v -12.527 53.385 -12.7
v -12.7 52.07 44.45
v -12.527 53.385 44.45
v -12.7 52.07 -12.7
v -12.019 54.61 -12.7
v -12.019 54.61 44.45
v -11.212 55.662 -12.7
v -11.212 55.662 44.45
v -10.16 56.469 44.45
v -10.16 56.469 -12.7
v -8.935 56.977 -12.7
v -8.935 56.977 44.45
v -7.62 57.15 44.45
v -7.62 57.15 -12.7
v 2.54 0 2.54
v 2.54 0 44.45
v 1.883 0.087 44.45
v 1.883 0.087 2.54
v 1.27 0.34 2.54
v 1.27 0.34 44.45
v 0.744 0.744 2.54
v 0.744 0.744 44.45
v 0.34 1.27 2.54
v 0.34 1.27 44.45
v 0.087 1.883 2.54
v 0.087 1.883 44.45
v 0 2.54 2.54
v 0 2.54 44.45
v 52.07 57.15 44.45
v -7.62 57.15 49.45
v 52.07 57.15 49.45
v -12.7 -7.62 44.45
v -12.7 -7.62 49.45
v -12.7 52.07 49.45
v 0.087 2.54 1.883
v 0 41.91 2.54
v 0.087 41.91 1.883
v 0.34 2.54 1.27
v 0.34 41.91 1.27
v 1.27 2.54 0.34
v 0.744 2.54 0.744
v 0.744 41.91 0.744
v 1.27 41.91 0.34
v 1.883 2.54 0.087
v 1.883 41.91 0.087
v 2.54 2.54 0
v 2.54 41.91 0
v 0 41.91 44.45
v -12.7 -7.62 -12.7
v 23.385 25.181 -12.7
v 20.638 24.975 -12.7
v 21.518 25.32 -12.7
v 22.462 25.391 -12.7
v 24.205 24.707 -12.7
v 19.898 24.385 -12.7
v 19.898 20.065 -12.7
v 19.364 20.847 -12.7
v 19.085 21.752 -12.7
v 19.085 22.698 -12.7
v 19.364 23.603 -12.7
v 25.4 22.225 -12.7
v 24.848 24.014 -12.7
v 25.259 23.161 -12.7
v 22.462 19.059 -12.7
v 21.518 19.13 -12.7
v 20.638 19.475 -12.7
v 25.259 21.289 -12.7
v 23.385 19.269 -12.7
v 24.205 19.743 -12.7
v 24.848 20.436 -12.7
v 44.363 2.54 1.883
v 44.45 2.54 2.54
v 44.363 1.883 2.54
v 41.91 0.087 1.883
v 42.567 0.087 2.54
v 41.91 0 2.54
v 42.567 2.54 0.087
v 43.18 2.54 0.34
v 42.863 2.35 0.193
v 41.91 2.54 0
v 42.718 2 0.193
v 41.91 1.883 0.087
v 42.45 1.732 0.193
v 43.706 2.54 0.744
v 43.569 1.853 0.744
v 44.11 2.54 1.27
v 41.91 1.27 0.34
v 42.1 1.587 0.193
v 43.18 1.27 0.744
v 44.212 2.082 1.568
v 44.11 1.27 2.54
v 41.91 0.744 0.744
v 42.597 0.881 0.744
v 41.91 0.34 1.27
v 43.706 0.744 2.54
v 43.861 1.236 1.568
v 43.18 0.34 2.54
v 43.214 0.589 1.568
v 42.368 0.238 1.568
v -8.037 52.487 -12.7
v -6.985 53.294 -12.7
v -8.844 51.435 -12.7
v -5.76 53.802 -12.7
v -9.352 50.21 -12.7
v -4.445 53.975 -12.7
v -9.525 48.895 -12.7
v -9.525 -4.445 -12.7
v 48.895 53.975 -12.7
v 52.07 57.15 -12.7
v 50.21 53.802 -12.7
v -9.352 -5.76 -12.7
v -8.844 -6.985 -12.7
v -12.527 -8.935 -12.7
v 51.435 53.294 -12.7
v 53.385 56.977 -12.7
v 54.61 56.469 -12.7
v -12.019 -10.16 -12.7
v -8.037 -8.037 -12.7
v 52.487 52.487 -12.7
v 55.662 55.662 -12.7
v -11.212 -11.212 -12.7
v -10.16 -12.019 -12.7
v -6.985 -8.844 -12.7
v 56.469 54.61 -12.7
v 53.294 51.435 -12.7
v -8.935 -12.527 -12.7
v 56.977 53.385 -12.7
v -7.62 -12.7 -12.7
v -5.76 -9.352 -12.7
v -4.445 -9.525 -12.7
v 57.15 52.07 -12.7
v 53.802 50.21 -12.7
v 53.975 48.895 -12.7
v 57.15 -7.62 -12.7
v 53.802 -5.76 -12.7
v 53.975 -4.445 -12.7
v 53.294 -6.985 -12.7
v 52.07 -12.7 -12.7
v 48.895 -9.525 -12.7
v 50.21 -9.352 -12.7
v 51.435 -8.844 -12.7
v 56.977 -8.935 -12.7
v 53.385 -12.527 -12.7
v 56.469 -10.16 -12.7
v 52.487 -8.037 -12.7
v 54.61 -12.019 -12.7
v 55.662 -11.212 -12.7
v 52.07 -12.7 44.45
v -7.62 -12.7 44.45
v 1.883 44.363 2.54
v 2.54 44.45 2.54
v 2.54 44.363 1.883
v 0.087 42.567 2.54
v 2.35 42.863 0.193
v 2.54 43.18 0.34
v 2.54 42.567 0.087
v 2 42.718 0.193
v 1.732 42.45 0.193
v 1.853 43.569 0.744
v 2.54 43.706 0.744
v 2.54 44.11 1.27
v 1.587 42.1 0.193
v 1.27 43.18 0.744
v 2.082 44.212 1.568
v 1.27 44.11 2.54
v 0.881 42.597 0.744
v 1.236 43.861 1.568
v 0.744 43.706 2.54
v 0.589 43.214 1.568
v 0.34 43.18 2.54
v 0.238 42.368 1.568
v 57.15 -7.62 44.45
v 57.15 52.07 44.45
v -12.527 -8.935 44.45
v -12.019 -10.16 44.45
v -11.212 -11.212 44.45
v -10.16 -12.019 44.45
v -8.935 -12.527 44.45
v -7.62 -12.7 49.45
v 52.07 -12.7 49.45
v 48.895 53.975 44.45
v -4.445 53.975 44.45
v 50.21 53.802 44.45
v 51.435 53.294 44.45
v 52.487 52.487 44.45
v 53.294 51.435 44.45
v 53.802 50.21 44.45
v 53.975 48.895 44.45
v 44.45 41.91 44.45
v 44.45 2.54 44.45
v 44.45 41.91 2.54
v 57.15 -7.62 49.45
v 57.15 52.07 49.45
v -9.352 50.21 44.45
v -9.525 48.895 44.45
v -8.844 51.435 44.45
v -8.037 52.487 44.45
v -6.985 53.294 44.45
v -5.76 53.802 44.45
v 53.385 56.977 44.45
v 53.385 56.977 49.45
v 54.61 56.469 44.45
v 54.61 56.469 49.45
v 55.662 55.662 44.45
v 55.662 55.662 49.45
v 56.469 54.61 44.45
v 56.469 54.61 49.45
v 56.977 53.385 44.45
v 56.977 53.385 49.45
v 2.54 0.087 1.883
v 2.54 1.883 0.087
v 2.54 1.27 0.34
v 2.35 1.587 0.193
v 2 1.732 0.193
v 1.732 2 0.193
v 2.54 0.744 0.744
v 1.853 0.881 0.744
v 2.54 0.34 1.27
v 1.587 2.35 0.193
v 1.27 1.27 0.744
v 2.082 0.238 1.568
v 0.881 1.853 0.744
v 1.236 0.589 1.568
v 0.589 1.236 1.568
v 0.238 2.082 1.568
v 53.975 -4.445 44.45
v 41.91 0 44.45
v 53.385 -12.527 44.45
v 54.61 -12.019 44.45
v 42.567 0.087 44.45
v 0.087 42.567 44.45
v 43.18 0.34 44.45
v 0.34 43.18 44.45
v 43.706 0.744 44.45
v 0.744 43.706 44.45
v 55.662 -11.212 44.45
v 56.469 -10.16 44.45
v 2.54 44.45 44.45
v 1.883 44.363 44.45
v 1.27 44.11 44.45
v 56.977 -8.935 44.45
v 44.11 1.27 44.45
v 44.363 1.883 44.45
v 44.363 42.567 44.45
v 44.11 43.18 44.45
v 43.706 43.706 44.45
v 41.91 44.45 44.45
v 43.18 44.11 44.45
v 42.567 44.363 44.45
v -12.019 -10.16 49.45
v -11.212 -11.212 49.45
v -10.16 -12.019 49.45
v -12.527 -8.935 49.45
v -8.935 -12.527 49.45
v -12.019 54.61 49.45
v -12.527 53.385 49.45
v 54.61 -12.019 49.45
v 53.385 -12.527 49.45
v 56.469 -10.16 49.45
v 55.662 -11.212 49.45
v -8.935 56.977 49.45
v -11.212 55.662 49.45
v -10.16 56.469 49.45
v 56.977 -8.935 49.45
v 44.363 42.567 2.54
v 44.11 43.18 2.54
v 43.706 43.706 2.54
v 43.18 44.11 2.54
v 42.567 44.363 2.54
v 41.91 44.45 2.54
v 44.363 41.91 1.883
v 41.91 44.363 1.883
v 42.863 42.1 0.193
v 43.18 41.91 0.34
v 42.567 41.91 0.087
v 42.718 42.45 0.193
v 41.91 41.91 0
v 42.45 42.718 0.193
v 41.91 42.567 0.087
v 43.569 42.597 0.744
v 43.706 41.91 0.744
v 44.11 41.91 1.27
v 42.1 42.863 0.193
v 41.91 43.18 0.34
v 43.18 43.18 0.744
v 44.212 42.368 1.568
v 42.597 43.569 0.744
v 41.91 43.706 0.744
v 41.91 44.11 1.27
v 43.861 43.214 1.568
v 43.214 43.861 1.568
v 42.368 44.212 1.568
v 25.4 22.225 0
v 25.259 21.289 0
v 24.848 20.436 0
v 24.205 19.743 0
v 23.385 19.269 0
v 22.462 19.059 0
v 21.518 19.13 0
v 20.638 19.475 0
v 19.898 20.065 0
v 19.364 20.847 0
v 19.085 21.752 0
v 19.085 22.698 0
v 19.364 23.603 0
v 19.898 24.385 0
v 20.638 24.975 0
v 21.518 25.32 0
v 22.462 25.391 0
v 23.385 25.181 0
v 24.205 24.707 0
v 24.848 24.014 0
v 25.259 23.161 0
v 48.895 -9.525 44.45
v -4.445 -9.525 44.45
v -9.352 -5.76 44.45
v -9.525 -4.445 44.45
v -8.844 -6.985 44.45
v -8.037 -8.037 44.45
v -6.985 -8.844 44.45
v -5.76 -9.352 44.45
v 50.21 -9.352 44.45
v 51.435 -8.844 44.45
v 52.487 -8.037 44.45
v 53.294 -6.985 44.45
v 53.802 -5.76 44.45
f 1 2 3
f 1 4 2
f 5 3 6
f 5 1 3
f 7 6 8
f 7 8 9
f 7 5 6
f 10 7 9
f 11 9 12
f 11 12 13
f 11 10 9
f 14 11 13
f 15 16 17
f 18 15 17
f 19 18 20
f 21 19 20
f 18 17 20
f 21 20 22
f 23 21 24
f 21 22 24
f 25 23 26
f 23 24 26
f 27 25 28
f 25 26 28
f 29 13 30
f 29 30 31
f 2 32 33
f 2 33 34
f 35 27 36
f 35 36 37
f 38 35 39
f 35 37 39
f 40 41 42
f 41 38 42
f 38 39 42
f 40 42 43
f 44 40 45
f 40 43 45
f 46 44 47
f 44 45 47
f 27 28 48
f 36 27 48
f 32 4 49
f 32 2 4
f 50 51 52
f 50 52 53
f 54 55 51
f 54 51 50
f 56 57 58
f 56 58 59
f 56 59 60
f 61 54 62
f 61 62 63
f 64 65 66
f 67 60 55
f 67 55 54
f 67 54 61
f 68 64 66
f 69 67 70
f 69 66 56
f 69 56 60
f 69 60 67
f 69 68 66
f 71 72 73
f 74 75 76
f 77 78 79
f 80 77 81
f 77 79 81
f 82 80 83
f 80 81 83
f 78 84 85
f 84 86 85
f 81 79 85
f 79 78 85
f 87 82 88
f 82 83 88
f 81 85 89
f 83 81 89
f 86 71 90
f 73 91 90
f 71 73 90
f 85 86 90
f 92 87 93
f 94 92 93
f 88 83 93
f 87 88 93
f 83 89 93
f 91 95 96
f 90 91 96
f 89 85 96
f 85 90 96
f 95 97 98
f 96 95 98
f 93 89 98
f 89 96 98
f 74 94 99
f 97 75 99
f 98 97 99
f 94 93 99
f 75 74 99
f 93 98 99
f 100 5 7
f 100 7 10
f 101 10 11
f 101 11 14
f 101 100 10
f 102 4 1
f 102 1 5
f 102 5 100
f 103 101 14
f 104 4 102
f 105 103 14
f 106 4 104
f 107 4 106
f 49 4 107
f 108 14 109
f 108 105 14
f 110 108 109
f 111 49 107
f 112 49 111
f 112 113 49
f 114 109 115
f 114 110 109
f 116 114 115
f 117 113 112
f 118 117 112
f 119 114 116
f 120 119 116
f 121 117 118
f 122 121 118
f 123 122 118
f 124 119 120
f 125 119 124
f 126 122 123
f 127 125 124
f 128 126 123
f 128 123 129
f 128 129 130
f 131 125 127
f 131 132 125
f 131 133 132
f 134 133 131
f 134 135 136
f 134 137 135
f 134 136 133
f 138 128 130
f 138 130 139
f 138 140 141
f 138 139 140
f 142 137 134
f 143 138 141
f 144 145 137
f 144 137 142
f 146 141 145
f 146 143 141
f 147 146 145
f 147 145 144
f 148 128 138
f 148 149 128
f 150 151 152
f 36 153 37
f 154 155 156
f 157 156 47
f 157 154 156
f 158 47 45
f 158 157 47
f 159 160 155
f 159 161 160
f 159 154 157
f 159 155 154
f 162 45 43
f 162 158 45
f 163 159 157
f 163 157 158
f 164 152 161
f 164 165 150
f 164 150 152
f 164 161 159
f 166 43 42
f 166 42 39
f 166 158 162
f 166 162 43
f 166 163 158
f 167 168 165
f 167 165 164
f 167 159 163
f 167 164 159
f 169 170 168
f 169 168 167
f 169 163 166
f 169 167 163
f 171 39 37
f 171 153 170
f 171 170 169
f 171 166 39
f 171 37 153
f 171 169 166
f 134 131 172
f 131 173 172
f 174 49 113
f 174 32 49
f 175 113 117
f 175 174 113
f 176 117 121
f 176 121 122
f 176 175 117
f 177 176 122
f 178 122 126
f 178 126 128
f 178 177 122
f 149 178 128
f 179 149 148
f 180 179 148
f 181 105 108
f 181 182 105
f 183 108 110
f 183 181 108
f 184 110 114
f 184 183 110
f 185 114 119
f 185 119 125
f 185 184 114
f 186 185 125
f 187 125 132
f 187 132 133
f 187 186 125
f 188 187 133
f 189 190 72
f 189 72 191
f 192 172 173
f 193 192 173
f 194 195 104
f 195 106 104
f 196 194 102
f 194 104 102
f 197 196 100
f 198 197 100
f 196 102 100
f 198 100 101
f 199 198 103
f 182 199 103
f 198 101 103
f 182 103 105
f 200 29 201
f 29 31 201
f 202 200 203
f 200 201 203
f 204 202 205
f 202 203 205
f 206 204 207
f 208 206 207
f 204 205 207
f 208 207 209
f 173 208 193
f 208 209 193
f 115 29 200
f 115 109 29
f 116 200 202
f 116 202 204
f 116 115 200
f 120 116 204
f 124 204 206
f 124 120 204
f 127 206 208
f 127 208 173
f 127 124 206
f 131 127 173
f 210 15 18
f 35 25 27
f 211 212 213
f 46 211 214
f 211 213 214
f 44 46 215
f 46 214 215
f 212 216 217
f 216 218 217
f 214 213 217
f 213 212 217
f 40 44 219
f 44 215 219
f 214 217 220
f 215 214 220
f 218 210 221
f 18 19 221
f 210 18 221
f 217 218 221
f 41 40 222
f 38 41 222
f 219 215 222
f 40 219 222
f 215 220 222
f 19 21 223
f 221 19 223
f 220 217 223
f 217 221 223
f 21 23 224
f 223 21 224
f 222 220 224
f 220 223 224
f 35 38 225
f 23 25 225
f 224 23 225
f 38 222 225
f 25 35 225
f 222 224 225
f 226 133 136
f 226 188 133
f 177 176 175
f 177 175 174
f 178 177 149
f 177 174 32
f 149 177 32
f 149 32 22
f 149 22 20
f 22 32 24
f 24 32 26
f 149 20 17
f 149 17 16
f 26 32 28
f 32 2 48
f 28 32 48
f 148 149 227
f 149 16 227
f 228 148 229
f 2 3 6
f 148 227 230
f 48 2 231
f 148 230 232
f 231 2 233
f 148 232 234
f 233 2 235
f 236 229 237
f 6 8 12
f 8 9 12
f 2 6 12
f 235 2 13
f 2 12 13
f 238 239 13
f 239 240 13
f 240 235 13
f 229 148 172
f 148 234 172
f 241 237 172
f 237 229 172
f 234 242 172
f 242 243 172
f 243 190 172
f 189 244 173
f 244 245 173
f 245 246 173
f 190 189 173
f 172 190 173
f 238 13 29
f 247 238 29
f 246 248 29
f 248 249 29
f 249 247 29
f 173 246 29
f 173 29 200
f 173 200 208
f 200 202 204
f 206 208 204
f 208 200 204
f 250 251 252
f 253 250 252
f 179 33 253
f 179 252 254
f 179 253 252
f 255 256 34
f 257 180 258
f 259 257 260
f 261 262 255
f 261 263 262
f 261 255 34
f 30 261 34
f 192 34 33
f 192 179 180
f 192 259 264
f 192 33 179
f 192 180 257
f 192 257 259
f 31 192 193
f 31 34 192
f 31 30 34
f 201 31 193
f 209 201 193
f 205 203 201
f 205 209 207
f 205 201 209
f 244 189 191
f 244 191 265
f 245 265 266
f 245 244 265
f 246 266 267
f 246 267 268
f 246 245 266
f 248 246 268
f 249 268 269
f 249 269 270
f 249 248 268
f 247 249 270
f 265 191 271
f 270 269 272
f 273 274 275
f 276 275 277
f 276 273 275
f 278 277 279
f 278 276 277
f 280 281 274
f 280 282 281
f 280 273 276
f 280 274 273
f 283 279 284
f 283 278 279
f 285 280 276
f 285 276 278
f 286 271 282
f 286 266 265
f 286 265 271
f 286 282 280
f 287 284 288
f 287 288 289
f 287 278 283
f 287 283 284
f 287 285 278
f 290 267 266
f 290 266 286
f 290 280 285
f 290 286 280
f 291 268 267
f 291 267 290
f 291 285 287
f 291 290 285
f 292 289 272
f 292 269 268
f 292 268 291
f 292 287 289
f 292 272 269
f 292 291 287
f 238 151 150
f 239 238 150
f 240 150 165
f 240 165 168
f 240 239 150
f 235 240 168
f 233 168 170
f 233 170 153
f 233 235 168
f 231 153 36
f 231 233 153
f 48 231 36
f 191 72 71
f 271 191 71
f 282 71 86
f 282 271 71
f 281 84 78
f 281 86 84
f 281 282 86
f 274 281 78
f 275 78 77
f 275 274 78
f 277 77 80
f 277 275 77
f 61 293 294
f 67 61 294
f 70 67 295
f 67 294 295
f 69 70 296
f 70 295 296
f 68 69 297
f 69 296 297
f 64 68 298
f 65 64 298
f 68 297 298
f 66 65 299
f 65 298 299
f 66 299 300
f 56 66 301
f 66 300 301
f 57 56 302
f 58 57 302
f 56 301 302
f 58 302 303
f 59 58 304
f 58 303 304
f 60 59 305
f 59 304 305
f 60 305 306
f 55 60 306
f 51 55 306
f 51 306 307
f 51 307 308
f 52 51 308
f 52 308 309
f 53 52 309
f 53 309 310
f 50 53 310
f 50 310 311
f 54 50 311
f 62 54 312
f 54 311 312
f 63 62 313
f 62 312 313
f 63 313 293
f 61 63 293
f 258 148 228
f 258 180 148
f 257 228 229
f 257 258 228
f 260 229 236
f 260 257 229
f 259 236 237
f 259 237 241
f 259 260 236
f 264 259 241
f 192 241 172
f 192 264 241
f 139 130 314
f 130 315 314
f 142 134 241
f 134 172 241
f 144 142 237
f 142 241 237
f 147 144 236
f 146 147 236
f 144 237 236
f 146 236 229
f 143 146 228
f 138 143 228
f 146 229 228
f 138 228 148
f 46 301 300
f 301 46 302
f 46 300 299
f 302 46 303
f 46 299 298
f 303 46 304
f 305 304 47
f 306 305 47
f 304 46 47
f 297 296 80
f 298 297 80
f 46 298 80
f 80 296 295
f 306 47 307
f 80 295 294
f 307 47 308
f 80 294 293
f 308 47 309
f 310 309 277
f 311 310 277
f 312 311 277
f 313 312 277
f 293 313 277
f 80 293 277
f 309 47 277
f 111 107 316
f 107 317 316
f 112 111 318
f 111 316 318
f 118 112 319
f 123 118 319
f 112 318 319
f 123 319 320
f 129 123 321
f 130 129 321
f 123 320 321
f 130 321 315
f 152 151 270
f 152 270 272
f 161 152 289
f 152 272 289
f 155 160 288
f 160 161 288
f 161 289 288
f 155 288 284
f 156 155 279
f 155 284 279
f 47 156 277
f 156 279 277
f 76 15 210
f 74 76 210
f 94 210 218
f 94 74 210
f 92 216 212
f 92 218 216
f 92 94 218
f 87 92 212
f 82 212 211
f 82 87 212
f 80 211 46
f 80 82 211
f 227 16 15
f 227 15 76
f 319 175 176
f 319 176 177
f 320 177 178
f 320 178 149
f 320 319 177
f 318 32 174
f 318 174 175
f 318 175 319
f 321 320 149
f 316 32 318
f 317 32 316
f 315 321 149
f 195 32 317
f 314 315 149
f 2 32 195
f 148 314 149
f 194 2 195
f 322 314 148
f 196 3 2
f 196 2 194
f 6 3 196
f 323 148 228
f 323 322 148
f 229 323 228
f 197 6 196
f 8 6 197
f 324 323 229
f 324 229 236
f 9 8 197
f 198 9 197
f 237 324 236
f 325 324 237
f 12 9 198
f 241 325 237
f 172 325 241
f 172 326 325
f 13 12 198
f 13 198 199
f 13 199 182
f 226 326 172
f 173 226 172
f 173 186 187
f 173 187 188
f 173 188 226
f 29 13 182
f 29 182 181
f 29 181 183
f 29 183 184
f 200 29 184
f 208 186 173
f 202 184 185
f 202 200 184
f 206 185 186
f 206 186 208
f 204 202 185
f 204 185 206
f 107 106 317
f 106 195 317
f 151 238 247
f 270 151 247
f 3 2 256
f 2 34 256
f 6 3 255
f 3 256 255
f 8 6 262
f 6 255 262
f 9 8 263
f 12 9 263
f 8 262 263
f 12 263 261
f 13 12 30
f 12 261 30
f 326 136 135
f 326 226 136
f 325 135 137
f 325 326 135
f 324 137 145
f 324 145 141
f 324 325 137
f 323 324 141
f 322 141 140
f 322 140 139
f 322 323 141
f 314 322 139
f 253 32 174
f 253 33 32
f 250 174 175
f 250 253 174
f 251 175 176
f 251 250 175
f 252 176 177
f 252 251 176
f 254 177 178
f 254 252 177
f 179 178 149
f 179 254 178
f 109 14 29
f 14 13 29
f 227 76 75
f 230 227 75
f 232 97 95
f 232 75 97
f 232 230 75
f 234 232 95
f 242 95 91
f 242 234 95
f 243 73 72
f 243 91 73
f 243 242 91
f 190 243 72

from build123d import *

# Parameters (mm, degrees)
F0_W      = 69.85
F0_H      = 69.85
F0_W_2    = 63.5
F0_H_2    = 63.5
F1_DEPTH  = 44.45
F0_W_3    = 44.45
F0_H_3    = 44.45
F2_W      = 69.85
F2_H      = 69.85
F3_DEPTH  = 5
F4_W      = 69.85
F4_H      = 69.85
F4_W_2    = 63.5
F4_H_2    = 63.5
F5_DEPTH  = 12.7
F6_R      = 5.08
F6_2_R    = 5.08
F7_R      = 2.54
F8_R      = 5.08
F9_R      = 3.175
F10_DEPTH = 12.7


with BuildPart() as f1:
    # F0 (on Top) → F1 (new body)
    with BuildSketch(Plane.XY):
        with Locations((22.225, 22.225)):
            Rectangle(F0_W, F0_H)
        with Locations((22.225, 22.225)):
            Rectangle(F0_W_2, F0_H_2, mode=Mode.SUBTRACT)
    extrude(amount=F1_DEPTH)

    # F4 (on face) → F5 (join)
    with BuildSketch(Plane(origin=(0, 0, 0), x_dir=(1, 0, 0), z_dir=(0, 0, -1))):
        with Locations((22.225, -22.225)):
            Rectangle(F4_W, F4_H)
        with Locations((22.225, -22.225)):
            Rectangle(F4_W_2, F4_H_2, mode=Mode.SUBTRACT)
    extrude(amount=F5_DEPTH)

    # F6
    f6_edges = [f1.edges().sort_by_distance(p)[0] for p in [
        (53.975, -9.525, 15.875),
        (-9.525, -9.525, 15.875),
        (-9.525, 53.975, 15.875),
        (53.975, 53.975, 15.875),
        (-12.7, -12.7, 15.875),
        (-12.7, 57.15, 15.875),
        (57.15, 57.15, 15.875),
        (57.15, -12.7, 15.875),
    ]]
    fillet(f6_edges, radius=F6_R)


with BuildPart() as f1b:
    # F0 (on Top) → F1, piece 2 (new body)
    with BuildSketch(Plane.XY):
        with Locations((22.225, 22.225)):
            Rectangle(F0_W_3, F0_H_3)
    extrude(amount=F1_DEPTH)

    # F2 (on face) → F3 (join)
    with BuildSketch(Plane.XY.offset(44.45)):
        with Locations((22.225, 22.225)):
            Rectangle(F2_W, F2_H)
    extrude(amount=F3_DEPTH)

    # F6#2
    f6_2_edges = [f1b.edges().sort_by_distance(p)[0] for p in [
        (-12.7, -12.7, 46.95),
    ]]
    fillet(f6_2_edges, radius=F6_2_R)

    # F7
    f7_edges = [f1b.edges().sort_by_distance(p)[0] for p in [
        (0, 0, 22.225),
        (44.45, 0, 22.225),
        (0, 44.45, 22.225),
        (44.45, 44.45, 22.225),
        (44.45, 22.225, 0),
        (22.225, 44.45, 0),
        (22.225, 0, 0),
        (0, 22.225, 0),
    ]]
    fillet(f7_edges, radius=F7_R)

    # F8
    f8_edges = [f1b.edges().sort_by_distance(p)[0] for p in [
        (57.15, 57.15, 46.95),
        (-12.7, 57.15, 46.95),
        (57.15, -12.7, 46.95),
    ]]
    fillet(f8_edges, radius=F8_R)

    # F9 (on face) → F10 (join)
    with BuildSketch(Plane(origin=(0, 0, 0), x_dir=(1, 0, 0), z_dir=(0, 0, -1))):
        with Locations((22.225, -22.225)):
            Circle(F9_R)
    extrude(amount=F10_DEPTH)


solid = Compound([f1.part, f1b.part])
